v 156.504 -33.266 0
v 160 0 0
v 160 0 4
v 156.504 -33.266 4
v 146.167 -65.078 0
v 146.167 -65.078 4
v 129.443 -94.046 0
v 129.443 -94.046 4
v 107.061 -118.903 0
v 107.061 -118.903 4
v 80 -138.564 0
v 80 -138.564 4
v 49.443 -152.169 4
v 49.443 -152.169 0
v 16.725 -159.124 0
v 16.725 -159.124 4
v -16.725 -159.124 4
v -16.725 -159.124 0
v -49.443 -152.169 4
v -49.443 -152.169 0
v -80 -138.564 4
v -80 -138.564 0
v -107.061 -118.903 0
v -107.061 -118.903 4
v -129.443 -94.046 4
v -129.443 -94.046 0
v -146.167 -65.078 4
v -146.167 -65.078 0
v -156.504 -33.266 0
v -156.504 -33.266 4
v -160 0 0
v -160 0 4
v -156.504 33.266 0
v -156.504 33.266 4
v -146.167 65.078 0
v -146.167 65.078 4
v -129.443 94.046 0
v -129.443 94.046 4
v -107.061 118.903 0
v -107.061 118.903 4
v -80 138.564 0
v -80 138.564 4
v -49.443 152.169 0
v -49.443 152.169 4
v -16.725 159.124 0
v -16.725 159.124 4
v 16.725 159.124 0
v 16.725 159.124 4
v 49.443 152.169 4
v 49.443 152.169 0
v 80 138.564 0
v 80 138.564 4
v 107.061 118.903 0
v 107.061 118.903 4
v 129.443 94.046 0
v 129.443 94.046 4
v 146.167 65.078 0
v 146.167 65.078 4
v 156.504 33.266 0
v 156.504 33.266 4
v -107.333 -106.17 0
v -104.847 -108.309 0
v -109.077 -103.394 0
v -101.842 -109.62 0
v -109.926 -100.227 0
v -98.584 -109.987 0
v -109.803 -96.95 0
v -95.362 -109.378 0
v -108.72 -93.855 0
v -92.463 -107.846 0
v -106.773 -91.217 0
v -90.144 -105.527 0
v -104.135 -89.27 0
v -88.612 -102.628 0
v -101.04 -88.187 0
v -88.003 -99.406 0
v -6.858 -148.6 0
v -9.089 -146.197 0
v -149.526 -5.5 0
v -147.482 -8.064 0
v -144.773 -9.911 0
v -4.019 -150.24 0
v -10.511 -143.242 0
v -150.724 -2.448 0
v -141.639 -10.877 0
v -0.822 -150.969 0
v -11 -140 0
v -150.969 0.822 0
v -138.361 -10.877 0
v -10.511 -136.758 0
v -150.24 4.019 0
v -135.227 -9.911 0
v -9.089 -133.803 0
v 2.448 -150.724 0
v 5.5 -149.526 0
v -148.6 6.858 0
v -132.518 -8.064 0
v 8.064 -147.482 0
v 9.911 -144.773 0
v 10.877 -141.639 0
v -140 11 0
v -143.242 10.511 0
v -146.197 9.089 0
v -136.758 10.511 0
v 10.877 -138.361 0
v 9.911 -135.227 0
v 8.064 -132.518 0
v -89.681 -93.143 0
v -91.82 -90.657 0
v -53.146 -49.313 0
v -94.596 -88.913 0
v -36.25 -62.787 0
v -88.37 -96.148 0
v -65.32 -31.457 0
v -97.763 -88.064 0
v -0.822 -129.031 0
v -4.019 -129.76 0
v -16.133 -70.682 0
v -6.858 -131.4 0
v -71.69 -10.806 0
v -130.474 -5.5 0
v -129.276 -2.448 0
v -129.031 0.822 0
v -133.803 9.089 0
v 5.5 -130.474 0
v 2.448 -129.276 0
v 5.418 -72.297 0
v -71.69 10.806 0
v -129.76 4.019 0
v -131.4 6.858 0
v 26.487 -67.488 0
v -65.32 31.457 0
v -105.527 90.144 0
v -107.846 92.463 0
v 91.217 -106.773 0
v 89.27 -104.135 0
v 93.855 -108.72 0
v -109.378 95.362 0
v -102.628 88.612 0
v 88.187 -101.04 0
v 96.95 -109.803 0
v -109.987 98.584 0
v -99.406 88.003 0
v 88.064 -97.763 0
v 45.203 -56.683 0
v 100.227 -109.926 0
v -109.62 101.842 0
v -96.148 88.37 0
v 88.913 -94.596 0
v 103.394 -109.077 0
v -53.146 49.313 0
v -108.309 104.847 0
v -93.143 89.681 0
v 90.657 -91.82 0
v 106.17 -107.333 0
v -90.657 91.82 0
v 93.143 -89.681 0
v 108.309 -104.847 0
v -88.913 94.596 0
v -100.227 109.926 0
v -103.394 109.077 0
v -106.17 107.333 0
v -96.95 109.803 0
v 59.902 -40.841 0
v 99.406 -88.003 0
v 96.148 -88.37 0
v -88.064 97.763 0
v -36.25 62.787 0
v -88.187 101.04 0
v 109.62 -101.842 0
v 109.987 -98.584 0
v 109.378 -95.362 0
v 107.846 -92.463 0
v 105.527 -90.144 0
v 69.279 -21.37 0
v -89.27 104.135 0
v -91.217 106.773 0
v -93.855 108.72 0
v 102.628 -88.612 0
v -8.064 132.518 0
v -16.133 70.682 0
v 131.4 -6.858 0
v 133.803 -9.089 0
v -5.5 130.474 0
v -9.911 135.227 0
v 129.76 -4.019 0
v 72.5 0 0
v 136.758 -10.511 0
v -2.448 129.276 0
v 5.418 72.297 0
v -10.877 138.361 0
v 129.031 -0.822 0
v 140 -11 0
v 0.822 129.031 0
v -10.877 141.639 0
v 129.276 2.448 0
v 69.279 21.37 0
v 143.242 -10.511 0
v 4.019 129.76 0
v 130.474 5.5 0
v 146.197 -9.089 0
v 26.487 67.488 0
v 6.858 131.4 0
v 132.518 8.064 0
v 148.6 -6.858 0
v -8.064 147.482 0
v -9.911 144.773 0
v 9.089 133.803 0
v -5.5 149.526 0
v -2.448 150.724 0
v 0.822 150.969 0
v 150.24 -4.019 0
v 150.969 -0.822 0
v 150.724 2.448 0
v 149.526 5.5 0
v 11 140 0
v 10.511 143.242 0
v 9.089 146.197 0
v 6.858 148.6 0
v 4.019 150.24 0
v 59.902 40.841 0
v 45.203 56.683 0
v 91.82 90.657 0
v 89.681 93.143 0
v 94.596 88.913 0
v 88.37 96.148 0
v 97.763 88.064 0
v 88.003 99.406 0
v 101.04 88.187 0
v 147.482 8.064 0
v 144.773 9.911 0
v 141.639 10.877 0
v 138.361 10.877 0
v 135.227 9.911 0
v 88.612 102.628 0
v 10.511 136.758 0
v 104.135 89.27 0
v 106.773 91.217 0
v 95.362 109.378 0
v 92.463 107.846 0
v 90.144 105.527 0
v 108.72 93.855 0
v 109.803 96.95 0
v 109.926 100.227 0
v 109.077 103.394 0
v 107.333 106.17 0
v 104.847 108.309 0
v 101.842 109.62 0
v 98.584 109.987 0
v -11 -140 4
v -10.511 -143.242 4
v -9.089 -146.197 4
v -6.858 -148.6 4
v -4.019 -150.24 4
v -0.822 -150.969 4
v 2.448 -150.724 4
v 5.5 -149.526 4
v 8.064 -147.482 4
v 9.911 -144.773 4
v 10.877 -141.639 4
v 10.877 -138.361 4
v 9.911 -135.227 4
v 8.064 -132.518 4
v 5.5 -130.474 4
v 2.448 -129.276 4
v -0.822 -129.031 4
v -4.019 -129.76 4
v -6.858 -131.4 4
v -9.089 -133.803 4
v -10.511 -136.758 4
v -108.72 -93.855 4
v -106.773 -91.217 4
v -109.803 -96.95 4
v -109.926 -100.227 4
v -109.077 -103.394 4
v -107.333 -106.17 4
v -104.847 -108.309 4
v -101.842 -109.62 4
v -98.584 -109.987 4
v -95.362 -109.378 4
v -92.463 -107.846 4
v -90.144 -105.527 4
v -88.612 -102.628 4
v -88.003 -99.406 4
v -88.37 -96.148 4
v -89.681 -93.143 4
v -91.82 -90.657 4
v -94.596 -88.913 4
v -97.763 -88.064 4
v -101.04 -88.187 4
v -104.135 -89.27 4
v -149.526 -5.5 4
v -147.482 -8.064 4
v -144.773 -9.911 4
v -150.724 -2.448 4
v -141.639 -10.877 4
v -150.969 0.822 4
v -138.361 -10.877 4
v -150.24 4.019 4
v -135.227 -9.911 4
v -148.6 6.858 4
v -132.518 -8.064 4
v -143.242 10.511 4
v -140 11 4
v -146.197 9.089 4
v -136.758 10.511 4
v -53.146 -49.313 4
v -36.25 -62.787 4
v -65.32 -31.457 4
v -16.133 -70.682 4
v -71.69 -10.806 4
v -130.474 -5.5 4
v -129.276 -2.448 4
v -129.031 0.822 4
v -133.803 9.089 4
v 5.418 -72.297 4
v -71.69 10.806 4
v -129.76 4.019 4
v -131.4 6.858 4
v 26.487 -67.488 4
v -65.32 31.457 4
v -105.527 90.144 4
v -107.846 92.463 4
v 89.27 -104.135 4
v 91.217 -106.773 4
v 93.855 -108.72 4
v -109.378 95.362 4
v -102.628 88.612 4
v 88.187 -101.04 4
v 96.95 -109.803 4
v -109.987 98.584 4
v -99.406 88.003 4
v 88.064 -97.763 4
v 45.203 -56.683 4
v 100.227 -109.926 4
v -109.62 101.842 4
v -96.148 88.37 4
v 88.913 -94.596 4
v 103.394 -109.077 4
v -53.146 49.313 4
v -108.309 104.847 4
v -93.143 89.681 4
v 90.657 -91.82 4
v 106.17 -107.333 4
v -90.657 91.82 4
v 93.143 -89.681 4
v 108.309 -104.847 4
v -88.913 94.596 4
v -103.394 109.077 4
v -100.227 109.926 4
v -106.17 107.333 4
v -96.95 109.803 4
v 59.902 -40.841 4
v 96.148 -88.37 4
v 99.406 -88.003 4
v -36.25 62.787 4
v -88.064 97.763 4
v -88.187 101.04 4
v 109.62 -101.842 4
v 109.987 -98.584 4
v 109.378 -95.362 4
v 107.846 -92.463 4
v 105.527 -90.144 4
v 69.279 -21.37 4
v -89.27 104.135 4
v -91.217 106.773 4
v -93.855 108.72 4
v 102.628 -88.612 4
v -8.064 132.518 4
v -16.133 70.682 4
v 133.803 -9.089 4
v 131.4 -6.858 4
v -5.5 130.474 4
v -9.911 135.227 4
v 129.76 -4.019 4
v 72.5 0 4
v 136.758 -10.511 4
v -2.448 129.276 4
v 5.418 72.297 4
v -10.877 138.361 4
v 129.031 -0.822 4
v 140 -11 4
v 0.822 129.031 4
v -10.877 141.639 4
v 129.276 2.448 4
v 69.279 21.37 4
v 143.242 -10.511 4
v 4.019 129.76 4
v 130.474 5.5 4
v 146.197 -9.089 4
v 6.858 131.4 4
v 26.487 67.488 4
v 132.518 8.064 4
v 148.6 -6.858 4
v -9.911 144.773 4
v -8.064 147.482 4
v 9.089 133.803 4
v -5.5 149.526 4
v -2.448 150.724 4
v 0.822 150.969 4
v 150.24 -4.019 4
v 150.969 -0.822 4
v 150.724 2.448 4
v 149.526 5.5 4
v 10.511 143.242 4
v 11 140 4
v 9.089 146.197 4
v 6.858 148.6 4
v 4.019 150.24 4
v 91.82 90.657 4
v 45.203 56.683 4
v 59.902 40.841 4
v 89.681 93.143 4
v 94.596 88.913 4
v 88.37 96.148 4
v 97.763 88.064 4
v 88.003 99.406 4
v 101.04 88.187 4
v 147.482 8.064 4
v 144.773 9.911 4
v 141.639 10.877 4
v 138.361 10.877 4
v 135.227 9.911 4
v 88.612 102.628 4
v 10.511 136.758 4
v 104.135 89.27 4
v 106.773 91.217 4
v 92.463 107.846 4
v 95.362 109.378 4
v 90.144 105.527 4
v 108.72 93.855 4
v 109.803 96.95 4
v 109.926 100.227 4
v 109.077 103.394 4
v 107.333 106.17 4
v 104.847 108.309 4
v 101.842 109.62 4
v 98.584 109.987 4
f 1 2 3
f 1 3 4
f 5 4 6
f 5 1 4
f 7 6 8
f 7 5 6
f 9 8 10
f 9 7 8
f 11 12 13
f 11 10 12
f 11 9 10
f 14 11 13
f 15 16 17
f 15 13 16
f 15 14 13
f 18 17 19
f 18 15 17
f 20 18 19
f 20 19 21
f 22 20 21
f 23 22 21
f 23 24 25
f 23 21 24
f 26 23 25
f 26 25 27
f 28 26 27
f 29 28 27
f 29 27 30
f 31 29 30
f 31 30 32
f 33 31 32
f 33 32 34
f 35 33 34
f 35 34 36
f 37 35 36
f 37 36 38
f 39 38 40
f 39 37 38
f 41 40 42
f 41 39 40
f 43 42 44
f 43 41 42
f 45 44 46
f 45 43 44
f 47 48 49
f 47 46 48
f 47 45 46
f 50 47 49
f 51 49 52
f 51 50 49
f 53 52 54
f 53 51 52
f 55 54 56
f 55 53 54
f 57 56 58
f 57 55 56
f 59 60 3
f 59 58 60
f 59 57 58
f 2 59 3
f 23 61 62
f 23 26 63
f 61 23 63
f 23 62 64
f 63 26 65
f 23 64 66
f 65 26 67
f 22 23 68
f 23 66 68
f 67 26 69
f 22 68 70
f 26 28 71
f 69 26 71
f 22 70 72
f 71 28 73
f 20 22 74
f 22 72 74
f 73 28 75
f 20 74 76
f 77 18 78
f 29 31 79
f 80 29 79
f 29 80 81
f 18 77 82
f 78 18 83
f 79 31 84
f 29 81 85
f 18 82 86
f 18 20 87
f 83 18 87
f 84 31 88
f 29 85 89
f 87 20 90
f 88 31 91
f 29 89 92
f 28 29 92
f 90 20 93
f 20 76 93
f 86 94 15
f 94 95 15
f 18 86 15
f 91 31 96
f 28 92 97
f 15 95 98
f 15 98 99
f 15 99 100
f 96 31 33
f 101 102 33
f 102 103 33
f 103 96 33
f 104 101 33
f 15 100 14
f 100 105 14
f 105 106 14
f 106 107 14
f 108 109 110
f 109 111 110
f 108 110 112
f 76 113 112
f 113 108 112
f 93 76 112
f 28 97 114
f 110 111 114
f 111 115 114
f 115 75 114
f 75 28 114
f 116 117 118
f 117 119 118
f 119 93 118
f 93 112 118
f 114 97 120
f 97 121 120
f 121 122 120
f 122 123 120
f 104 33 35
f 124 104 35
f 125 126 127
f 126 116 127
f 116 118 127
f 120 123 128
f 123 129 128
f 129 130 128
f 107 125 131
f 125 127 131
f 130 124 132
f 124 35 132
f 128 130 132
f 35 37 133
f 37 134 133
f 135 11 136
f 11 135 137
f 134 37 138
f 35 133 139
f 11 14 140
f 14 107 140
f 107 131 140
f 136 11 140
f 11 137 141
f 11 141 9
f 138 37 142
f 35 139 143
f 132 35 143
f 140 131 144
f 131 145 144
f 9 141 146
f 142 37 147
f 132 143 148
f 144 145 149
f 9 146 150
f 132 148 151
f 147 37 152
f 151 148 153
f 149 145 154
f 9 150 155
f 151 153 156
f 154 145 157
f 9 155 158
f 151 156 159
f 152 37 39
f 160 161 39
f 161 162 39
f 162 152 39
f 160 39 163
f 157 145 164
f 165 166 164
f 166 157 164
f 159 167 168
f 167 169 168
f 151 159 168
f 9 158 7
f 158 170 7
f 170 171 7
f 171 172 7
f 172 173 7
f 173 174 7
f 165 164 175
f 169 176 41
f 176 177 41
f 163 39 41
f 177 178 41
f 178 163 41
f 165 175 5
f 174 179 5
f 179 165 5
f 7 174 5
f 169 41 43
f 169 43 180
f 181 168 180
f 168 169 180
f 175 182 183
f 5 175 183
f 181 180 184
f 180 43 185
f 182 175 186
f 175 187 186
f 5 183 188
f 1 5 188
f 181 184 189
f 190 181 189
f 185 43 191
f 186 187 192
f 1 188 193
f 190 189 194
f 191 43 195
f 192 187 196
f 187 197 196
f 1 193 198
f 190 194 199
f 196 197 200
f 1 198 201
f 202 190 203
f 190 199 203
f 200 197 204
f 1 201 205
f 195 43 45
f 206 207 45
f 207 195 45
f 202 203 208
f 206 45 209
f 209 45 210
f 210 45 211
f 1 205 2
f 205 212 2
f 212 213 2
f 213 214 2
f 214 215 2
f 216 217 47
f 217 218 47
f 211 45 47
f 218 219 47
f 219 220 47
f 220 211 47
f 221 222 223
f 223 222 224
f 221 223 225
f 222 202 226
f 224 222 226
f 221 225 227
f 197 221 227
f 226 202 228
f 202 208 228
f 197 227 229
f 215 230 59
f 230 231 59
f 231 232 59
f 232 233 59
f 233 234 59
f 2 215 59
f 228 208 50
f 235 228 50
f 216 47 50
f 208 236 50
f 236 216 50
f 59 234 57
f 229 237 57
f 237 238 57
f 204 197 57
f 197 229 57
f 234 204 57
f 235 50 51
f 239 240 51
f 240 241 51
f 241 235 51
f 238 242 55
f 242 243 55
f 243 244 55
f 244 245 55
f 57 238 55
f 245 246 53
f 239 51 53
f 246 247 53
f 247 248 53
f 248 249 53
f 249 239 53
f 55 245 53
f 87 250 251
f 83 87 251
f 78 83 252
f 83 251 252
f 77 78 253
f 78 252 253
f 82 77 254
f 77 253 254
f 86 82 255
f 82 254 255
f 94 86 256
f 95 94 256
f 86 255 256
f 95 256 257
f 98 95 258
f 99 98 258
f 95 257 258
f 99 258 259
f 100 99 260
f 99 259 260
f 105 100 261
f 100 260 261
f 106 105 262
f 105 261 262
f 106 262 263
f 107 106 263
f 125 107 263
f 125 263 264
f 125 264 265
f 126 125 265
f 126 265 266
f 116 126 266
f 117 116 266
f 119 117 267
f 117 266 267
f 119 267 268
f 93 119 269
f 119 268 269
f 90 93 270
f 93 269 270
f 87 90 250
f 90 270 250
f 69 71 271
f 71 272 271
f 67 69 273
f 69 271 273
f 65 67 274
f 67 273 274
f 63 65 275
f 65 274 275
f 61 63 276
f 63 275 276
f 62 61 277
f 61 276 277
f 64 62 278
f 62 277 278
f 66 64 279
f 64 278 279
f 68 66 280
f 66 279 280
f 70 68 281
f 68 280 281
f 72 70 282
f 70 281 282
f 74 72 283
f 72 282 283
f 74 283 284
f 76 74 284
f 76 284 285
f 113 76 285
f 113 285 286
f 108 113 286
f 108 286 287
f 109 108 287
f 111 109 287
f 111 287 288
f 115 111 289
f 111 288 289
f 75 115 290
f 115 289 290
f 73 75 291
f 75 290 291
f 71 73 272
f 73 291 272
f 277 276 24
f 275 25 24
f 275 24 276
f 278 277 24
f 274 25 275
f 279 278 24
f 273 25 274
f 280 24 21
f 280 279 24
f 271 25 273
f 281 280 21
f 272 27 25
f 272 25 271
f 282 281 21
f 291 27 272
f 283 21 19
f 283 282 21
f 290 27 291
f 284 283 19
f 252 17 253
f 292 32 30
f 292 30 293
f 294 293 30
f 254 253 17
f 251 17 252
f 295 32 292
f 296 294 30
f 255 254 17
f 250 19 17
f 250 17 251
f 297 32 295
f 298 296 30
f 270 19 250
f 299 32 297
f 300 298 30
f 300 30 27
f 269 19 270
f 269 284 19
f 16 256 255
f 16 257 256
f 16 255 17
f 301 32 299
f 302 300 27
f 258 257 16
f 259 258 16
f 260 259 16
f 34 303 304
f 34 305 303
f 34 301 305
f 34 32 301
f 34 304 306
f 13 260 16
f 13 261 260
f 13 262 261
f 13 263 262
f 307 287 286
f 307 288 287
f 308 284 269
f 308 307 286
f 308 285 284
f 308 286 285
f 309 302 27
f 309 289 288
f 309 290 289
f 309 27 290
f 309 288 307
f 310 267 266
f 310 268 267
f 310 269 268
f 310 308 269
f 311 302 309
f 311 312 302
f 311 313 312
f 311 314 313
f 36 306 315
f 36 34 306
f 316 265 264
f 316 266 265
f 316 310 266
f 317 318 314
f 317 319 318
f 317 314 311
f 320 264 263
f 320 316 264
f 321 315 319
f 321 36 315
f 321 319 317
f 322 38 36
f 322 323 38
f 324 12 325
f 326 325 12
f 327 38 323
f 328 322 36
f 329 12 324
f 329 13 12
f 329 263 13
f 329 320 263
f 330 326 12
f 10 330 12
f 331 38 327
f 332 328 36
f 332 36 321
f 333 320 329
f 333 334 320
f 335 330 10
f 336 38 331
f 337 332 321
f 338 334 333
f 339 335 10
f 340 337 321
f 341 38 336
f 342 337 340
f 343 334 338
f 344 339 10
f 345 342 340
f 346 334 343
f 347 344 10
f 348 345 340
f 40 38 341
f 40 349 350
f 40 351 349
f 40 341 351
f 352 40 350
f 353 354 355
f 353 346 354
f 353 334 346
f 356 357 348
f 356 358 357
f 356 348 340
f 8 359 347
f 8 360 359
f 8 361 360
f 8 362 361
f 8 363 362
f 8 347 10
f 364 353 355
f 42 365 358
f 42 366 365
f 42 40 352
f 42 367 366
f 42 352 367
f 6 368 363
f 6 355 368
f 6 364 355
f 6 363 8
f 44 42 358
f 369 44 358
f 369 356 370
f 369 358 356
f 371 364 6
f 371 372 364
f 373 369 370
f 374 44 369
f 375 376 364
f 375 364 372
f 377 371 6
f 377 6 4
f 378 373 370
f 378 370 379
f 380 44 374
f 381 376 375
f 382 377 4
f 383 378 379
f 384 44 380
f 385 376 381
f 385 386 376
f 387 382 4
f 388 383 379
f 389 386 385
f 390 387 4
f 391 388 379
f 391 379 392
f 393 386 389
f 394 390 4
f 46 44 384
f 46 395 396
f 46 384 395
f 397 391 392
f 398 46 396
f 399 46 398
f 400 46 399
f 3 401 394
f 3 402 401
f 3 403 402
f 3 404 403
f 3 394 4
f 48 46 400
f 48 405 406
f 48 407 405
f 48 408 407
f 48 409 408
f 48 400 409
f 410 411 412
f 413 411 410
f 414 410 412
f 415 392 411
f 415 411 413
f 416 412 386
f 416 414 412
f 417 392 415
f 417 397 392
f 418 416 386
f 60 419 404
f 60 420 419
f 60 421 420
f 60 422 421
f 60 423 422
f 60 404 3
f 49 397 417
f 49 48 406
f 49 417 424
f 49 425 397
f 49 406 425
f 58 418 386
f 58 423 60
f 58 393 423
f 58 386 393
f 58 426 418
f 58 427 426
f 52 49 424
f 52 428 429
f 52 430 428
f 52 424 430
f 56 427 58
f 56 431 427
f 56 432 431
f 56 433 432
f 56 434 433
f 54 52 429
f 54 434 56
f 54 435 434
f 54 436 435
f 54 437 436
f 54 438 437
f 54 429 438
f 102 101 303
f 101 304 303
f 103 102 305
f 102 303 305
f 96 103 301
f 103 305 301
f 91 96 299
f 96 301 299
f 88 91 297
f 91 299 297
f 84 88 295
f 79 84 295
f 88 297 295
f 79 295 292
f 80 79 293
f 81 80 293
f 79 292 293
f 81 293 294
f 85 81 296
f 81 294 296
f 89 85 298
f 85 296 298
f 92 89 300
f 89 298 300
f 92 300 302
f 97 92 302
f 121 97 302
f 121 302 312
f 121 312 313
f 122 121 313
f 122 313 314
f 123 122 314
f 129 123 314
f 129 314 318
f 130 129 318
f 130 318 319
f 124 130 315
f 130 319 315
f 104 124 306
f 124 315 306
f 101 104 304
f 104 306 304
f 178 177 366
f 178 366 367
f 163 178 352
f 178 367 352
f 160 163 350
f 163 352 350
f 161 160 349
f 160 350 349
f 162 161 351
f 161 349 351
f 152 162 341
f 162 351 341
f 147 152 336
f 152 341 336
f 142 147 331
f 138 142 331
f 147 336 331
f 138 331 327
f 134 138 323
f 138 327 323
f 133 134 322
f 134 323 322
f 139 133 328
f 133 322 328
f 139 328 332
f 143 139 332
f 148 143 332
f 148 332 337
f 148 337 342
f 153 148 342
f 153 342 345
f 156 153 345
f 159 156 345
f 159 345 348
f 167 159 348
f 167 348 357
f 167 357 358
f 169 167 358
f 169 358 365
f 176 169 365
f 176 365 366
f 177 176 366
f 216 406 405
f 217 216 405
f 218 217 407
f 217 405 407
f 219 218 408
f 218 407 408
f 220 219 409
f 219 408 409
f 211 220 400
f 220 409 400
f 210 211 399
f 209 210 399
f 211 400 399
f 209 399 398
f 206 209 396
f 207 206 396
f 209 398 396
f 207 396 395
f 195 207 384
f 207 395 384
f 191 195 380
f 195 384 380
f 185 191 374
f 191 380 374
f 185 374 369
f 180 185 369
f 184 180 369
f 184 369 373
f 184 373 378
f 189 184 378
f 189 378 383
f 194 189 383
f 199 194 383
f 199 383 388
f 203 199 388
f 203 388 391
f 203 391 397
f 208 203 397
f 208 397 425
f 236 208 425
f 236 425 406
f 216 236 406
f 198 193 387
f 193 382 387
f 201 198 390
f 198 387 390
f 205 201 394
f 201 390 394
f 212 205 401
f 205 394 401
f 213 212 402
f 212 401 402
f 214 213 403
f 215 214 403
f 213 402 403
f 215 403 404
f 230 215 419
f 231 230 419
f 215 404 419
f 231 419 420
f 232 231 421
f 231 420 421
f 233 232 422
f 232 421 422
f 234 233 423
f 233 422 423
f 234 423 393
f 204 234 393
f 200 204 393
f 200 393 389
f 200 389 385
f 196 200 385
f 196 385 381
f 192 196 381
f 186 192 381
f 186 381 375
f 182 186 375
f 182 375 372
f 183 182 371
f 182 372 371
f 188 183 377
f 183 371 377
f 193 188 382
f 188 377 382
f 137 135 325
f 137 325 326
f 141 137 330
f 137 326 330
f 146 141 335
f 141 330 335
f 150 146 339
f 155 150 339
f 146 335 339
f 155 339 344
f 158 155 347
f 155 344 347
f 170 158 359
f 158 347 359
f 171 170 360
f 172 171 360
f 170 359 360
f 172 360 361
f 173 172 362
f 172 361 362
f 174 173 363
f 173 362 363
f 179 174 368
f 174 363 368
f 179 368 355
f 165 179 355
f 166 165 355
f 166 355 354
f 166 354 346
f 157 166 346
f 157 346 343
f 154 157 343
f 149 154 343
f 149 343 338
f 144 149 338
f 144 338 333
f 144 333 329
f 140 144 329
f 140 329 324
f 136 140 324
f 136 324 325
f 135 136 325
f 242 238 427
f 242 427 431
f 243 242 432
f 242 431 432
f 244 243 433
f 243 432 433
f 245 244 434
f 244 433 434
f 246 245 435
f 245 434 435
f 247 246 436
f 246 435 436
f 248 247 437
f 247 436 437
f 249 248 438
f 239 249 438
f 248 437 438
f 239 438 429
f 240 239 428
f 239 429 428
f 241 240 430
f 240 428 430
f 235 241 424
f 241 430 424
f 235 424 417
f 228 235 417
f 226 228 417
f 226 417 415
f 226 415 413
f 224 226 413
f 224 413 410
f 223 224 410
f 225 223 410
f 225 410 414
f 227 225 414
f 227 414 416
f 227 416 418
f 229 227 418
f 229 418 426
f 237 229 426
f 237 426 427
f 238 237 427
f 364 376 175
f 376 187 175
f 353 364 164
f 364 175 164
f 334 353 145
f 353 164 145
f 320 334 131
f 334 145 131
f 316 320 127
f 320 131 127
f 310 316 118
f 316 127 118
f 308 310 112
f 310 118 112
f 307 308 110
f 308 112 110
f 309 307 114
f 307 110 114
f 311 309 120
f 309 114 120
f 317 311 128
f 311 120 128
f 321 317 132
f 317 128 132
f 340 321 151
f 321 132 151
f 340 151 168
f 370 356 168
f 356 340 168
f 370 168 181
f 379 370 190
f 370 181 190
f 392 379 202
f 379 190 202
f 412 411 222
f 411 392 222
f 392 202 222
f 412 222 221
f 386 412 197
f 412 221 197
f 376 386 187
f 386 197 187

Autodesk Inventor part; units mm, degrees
ref_plane "YZ Plane" through (0, 0, 0) normal (1, 0, 0) x (0, 1, 0)
ref_plane "XZ Plane" through (0, 0, 0) normal (0, 1, 0) x (-1, 0, 0)
ref_plane "XY Plane" through (0, 0, 0) normal (0, 0, 1) x (1, 0, 0)
sketch "Sketch1" plane through (0, 0, 0) normal (0, 0, 1) x (1, 0, 0)
  circle A0 centre (0, 0) radius 72.5
  circle A1 centre (0, 0) radius 160
  dimension "d22" = 145
  dimension "d23" = 320
extrude "Plate1" add sketch "Sketch1" along normal blind 4
sketch "Sketch5" plane through (0, 0, 4) normal (0, 0, 1) x (1, 0, 0)
  circle A0 centre (0, 140) radius 11
  circle A1 centre (0, 0) radius 140 construction
  circle A2 centre (0, 0) radius 190 construction
  circle A3 centre (0, 190) radius 6.5
  dimension "d25" = 280
  dimension "d32" = 380
  dimension "d24" = 22
  dimension "d31" = 13
extrude "Cut1" cut sketch "Sketch5" against normal blind 4 contours A0
pattern_circular "Circular Pattern1" count 8 over 360 about axis through (0, 0, 0) along (0, 0, 1) of "Cut1"
equation "\"d26\" = Thickness"
equation "\"d2\" = Thickness"
equation "\"BendReliefWidth\" = Thickness"
equation "\"BendReliefDepth\" = 0.5 * Thickness"
equation "\"CornerReliefSize\" = 4 * Thickness"
equation "\"MinimumRemnant\" = 2 * Thickness"
equation "\"TransitionRadius\" = BendRadius"
equation "\"JacobiRadiusSize\" = BendRadius"
equation "\"GapSize\" = Thickness"
equation "\"Thickness\" = 4"
equation "\"BendRadius\" = 5"
properties part number "TKS 3109 top DS main flange" material "Stainless Steel"
